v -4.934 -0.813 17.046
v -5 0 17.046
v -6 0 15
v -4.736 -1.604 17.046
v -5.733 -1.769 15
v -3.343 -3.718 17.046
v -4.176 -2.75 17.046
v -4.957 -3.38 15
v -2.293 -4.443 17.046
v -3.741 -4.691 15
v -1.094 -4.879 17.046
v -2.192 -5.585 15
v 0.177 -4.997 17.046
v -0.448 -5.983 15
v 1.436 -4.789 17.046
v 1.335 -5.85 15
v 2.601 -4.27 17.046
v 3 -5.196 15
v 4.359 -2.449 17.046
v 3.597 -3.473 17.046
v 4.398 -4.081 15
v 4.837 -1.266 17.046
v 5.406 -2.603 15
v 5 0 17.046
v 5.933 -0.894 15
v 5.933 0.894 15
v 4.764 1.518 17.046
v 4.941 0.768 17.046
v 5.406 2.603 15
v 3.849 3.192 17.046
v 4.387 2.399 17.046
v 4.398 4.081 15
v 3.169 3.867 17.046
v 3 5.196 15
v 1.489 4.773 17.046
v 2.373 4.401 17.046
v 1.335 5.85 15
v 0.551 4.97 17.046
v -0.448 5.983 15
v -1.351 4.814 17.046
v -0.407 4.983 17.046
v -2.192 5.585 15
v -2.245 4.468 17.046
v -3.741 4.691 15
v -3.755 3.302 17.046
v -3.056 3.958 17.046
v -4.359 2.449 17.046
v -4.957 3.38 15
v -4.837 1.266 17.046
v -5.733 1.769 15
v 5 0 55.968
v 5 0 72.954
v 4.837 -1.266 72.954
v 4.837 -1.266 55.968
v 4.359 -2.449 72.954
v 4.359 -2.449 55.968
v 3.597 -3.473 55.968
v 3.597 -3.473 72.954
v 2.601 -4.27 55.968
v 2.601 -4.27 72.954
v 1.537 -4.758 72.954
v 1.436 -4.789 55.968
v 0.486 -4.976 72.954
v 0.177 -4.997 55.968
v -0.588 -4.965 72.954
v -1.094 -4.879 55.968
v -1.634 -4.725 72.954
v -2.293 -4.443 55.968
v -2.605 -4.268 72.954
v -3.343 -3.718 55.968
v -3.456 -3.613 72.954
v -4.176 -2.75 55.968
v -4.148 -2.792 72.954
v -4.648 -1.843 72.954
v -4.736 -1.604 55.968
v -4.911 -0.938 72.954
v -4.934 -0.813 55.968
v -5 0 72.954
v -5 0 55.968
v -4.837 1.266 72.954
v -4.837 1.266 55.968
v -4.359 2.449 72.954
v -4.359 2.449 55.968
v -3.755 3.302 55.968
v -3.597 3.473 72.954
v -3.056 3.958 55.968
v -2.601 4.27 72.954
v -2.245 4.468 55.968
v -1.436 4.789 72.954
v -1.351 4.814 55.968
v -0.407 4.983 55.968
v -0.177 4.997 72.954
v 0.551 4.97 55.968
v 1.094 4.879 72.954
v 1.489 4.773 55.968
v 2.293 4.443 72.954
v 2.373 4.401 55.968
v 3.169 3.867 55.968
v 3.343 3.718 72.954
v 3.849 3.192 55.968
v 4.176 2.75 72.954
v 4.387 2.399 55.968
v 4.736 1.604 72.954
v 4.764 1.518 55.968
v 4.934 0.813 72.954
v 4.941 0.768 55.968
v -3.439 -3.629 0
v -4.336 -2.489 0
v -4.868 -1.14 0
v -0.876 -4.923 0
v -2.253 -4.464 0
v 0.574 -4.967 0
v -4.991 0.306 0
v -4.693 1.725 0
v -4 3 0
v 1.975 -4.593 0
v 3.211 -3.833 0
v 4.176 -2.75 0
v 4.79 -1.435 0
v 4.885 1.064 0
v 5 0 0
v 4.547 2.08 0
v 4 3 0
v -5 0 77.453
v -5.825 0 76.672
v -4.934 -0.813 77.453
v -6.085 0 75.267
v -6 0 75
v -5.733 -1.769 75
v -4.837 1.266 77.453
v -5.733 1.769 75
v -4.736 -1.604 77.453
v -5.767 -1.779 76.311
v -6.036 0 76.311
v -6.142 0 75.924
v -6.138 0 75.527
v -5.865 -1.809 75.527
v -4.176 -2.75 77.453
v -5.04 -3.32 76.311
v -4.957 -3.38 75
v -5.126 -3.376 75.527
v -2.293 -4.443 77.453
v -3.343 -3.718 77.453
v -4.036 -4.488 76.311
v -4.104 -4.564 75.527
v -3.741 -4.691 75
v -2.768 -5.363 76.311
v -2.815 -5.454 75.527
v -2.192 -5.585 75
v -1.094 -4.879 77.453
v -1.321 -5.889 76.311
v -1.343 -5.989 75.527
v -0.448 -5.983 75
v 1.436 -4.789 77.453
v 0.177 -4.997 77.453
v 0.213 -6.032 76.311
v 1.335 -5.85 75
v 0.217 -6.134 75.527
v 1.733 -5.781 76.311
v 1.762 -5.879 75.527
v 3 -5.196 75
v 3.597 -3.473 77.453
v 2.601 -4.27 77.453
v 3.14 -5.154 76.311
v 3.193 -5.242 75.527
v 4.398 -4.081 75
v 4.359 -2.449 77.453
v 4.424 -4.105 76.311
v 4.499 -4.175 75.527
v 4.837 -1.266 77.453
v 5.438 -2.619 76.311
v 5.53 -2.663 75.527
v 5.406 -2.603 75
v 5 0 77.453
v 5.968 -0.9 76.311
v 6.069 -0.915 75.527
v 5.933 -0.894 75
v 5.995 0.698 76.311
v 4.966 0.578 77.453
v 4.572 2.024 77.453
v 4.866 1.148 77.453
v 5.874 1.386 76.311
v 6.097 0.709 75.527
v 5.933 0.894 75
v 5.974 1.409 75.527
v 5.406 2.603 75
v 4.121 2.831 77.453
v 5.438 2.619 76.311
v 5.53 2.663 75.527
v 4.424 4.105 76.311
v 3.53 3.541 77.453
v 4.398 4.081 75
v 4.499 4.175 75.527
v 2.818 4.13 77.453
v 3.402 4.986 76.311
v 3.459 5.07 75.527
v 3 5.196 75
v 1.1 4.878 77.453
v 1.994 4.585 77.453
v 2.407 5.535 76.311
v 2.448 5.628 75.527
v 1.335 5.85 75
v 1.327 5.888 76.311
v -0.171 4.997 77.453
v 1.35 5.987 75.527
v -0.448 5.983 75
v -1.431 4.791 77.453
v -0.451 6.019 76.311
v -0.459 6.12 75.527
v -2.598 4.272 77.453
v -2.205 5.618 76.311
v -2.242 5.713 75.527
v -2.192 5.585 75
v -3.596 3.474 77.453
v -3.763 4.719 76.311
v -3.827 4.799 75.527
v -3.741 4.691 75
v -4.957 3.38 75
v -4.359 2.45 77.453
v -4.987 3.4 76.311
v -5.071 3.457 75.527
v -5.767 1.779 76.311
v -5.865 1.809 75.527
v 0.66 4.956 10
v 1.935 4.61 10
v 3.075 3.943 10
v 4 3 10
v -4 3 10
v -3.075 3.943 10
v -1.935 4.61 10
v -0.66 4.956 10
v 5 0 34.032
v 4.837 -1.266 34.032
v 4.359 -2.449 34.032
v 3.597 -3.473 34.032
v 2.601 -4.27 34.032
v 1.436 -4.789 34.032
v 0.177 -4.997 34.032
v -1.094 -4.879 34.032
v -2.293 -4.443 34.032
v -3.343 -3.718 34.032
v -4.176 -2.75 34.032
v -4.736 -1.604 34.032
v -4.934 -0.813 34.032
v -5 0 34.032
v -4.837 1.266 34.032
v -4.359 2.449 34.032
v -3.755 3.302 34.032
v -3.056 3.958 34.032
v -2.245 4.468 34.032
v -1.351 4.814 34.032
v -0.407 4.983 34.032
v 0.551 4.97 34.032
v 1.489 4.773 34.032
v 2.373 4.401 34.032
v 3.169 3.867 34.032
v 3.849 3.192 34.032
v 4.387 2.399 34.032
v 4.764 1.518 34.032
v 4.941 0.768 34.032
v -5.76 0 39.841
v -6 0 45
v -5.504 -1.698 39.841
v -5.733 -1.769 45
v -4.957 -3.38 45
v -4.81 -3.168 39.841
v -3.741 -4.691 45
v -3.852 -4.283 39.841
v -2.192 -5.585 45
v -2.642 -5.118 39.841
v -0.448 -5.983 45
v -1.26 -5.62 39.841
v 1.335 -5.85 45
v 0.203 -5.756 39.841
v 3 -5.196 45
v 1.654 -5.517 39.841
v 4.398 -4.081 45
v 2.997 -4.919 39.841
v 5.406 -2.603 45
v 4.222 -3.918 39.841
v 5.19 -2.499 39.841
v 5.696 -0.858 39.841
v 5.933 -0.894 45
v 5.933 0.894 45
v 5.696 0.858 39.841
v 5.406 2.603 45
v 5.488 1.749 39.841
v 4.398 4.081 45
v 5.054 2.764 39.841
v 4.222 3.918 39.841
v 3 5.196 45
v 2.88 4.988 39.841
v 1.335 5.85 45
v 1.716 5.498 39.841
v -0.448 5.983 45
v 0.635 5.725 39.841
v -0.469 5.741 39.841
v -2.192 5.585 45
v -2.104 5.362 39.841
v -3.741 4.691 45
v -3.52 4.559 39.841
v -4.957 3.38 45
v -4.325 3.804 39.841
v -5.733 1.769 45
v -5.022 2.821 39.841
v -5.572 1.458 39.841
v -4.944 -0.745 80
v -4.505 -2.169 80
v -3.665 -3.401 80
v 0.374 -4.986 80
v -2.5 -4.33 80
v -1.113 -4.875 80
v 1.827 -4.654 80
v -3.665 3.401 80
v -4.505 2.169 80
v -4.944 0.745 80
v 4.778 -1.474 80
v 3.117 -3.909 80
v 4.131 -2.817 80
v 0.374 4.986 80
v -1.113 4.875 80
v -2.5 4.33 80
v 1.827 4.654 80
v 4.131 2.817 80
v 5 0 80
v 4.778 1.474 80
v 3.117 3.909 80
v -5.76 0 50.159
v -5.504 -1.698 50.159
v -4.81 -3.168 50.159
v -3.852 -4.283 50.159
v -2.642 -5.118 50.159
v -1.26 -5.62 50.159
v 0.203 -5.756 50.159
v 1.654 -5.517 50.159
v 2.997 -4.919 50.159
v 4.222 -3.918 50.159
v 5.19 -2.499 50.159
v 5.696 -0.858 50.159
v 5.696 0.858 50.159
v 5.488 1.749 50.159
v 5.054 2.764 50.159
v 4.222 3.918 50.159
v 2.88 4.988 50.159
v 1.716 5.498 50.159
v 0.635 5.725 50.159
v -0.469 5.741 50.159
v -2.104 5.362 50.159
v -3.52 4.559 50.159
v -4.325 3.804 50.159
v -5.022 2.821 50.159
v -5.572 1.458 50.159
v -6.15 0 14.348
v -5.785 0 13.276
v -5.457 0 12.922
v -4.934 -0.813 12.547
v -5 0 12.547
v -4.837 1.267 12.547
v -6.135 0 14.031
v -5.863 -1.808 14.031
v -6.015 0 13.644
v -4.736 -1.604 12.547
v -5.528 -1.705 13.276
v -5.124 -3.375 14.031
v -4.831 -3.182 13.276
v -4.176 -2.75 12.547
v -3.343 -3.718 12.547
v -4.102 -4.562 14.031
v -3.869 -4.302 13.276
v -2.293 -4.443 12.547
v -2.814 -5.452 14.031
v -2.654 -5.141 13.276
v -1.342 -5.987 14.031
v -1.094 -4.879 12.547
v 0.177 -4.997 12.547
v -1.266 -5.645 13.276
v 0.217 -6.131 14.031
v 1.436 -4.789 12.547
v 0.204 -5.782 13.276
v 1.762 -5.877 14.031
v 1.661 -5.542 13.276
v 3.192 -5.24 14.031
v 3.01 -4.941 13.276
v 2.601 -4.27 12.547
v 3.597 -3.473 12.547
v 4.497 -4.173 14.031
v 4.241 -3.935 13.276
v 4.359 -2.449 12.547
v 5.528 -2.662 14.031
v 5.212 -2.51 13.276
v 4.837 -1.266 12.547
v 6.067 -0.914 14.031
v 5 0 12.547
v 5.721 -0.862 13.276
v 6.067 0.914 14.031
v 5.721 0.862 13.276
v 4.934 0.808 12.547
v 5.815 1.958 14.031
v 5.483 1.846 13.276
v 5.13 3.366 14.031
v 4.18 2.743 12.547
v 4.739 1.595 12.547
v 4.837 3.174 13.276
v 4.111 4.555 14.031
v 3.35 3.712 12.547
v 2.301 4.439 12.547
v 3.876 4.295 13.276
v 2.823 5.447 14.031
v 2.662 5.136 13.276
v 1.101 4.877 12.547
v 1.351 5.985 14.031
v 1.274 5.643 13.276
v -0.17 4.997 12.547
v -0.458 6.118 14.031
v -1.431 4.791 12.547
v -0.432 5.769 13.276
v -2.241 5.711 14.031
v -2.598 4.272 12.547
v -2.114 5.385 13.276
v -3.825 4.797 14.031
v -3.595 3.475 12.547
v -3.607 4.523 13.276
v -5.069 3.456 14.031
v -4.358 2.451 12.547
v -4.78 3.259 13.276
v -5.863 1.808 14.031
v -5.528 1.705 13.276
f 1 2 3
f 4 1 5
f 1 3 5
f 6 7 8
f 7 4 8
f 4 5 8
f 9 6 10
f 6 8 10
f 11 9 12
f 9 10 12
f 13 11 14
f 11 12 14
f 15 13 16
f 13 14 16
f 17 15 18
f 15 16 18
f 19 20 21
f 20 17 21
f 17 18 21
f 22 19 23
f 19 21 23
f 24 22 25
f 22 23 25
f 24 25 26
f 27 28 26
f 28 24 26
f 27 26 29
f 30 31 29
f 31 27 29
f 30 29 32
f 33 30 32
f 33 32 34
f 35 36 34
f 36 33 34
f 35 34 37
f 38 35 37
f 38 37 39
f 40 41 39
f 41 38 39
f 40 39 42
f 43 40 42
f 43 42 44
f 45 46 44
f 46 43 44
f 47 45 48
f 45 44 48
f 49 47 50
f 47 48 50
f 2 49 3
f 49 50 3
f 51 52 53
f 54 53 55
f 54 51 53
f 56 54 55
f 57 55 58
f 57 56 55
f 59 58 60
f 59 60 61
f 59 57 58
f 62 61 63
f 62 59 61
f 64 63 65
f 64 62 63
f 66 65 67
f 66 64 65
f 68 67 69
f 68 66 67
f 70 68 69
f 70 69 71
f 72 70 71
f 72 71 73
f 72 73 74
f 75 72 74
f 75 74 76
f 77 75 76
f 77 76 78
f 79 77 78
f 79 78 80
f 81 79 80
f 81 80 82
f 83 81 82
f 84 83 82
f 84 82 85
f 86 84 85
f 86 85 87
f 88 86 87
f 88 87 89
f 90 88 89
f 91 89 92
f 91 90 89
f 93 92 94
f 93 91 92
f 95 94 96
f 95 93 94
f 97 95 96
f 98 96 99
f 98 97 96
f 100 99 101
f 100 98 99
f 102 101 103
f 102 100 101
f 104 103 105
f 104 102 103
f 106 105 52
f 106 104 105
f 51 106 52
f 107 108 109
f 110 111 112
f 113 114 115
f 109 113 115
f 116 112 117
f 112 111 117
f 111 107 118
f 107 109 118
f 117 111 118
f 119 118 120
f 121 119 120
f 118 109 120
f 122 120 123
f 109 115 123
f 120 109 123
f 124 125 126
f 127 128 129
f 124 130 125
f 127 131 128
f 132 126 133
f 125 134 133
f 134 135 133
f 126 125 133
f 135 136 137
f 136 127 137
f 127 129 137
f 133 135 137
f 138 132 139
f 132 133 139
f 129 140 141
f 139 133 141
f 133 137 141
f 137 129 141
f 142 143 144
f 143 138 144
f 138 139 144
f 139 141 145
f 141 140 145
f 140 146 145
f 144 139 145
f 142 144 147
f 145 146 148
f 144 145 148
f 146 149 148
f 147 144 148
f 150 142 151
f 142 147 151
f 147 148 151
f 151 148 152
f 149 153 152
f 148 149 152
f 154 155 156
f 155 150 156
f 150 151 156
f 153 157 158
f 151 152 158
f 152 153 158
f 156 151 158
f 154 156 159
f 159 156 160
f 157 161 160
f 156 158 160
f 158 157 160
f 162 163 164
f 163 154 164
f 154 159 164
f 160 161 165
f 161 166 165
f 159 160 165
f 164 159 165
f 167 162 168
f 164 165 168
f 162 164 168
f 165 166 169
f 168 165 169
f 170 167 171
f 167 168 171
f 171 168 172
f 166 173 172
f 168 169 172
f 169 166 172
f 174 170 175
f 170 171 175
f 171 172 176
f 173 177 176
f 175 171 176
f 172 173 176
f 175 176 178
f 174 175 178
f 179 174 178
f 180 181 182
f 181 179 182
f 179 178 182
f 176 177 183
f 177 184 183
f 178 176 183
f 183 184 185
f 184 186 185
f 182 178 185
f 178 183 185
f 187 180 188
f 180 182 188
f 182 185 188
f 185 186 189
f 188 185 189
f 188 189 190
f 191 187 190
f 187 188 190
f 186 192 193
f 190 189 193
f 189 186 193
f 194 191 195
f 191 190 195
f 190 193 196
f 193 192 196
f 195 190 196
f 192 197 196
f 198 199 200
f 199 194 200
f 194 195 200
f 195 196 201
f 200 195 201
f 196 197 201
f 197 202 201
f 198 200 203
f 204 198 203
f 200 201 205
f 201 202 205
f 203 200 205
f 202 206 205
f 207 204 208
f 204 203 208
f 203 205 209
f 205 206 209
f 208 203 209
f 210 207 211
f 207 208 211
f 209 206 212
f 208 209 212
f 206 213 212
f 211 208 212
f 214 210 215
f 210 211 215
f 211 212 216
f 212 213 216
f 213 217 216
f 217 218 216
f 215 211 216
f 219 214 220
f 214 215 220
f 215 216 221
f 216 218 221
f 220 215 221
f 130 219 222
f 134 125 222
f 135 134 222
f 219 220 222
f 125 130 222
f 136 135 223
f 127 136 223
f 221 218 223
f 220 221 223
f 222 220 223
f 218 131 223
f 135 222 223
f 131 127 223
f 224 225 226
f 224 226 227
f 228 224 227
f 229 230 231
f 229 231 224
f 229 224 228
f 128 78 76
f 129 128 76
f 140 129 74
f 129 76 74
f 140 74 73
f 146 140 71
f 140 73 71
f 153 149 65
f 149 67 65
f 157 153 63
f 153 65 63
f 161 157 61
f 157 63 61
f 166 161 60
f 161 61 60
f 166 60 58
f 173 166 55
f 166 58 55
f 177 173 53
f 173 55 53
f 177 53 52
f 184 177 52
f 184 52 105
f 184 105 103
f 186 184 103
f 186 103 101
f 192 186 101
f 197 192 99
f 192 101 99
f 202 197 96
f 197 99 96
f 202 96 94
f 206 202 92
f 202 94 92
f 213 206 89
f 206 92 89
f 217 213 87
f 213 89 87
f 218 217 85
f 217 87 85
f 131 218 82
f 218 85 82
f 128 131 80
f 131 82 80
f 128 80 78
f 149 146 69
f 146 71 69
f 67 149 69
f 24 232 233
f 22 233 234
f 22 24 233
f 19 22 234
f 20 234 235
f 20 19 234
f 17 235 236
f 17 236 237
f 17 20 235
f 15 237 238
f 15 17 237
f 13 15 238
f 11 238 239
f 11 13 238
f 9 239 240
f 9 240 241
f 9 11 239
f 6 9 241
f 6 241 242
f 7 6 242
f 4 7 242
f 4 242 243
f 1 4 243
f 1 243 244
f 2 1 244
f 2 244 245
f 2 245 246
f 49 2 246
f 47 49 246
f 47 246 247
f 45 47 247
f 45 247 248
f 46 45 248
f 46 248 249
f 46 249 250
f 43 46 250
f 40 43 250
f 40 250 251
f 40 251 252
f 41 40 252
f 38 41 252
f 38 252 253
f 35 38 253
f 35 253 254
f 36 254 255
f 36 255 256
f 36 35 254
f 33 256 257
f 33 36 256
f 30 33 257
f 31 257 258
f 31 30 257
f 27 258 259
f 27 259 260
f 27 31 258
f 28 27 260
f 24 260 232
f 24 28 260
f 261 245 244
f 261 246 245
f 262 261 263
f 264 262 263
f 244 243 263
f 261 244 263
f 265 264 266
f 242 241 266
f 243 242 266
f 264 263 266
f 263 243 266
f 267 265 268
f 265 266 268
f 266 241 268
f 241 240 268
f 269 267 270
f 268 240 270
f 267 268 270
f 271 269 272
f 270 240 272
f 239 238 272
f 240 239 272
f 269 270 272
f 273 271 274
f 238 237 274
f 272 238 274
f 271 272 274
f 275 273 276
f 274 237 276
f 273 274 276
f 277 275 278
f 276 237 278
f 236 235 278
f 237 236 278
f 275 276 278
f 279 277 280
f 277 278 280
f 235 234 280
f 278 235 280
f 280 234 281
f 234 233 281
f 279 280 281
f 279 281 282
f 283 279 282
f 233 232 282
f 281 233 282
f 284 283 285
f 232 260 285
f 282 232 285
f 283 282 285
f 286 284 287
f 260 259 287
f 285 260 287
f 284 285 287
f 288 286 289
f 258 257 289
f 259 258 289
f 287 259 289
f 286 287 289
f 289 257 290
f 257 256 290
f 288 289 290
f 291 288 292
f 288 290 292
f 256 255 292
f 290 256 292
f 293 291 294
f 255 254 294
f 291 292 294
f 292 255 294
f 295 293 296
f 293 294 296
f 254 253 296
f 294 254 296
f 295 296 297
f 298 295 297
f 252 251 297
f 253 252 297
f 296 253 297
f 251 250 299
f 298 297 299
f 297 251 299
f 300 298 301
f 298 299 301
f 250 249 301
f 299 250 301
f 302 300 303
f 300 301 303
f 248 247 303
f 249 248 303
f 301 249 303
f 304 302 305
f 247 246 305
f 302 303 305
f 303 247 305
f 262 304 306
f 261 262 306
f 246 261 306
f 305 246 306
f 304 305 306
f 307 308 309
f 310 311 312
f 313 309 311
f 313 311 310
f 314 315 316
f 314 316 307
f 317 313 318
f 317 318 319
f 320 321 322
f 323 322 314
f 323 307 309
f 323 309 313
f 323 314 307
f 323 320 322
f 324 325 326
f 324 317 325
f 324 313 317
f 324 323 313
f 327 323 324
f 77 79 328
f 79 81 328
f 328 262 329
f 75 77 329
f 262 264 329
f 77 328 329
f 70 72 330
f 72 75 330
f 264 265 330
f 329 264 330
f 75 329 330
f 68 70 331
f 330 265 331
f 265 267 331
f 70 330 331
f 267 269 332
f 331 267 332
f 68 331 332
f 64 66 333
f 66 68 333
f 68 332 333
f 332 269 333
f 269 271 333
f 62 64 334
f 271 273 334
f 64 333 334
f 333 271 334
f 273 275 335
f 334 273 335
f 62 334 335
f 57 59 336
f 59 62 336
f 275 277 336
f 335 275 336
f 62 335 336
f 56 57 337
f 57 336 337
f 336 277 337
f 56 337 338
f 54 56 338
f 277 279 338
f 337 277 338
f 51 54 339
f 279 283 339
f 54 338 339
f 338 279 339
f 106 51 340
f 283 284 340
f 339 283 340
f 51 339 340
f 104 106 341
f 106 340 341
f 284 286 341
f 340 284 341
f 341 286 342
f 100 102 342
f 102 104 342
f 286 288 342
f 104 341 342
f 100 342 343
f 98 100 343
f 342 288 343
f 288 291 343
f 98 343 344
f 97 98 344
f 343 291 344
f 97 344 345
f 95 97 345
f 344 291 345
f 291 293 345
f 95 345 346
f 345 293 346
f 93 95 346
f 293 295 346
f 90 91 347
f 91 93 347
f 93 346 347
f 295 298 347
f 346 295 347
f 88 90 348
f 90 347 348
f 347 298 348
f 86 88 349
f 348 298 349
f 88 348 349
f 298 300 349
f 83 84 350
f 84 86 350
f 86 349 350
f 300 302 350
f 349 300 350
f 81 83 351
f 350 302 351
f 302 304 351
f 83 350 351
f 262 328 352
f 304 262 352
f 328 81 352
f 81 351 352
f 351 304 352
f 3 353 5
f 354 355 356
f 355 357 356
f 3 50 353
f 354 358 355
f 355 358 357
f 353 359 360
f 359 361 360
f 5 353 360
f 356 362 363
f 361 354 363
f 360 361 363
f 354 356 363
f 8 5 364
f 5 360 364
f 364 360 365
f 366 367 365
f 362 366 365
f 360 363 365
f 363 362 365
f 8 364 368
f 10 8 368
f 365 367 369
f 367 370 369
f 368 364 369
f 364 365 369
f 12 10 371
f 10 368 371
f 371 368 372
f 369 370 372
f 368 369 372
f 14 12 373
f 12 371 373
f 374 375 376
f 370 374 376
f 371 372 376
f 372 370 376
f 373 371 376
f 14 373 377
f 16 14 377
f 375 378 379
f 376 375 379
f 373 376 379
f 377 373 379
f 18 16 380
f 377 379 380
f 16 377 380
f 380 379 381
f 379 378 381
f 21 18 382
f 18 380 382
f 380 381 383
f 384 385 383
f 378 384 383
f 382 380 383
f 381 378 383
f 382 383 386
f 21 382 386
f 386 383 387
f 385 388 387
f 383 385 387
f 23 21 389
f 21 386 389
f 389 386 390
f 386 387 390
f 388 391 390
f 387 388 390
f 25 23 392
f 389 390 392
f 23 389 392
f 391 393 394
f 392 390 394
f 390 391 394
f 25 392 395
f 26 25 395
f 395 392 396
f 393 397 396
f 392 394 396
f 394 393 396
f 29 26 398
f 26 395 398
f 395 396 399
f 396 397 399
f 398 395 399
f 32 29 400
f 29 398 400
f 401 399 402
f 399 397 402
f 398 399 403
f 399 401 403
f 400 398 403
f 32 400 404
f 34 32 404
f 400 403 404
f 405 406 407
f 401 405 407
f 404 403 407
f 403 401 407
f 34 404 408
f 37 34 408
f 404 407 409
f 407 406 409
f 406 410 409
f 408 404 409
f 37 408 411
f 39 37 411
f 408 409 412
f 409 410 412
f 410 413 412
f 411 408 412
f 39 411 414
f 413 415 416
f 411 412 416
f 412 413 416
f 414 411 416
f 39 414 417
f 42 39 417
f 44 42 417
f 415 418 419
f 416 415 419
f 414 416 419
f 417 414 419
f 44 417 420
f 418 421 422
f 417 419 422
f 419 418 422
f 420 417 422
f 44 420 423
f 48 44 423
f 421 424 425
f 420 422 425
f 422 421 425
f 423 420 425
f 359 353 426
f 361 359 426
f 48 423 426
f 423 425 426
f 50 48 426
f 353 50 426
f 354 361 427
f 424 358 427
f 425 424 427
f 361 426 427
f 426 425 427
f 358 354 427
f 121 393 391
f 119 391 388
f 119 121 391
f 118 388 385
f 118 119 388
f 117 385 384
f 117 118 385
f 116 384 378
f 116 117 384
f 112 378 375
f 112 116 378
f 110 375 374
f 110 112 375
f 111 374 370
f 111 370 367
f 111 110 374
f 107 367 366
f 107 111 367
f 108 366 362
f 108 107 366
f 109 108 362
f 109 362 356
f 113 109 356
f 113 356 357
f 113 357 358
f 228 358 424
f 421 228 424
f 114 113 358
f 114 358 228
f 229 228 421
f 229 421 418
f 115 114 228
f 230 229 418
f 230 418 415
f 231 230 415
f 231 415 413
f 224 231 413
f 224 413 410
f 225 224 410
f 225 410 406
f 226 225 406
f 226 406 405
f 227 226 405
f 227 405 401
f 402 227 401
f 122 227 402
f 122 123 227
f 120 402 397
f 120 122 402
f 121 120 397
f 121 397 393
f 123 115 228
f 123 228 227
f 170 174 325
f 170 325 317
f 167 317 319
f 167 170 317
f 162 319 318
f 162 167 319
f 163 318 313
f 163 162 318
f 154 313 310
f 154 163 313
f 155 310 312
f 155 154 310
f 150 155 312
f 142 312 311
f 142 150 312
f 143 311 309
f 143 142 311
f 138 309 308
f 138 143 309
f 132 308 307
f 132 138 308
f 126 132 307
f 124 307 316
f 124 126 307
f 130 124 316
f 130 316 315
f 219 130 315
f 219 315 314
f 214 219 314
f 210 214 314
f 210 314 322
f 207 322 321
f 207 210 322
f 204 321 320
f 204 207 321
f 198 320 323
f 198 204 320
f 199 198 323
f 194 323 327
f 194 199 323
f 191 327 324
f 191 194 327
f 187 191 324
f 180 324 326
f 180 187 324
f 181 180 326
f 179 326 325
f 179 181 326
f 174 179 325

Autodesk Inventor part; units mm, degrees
ref_plane "YZ Plane" through (0, 0, 0) normal (1, 0, 0) x (0, 1, 0)
ref_plane "XY Plane" through (0, 0, 0) normal (0, 0, 1) x (1, 0, 0)
sketch "Эскиз1" plane through (0, 0, 0) normal (0, 0, 1) x (1, 0, 0)
  circle A0 centre (0, 0) radius 5
  dimension "d0" = 10
extrude "Выдавливание1" add sketch "Эскиз1" along normal blind 80
sketch "Эскиз2" plane through (0, 0, 0) normal (0, 0, -1) x (-1, 0, 0)
  line L0 (0, 0) -> (0, 3)
  line L1 (0, 3) -> (-4, 3)
  circle A0 centre (0, 0) radius 5 projected
  line L2 (4, 3) -> (0, 3)
extrude "Выдавливание2" cut sketch "Эскиз2" against normal blind 10 contours L1 A0 L2 picked at (-2.4012, 3.2796)
ref_plane "РабПлоскость1" through (0, 0, 0) normal (0, 1, 0) x (-1, 0, 0)
sketch "Эскиз3" plane through (0, 0, 0) normal (0, 1, 0) x (-1, 0, 0)
  line L0 (0, 10) -> (0, 80)
  line L1 (5, 80) -> (-5, 80) projected
  line L2 (0, 10) -> (0, 15)
  line L3 (0, 15) -> (6, 15)
  line L4 (0, 15) -> (0, 20)
  line L5 (0, 20) -> (4, 20)
  line L6 (0, 20) -> (0, 45)
  line L7 (0, 45) -> (0, 70)
  line L8 (0, 70) -> (4, 70)
  line L9 (0, 70) -> (0, 75)
  line L10 (0, 75) -> (6, 75)
  line L11 (0, 45) -> (6, 45)
  spline S0 degree 4 poles (0, 80) (13.7387, 74.1571) (-5.0029, 77.0727) (17.394, 45) (-5.0029, 12.9273) (13.7387, 15.8429) (0, 10) knots 0 0 0 0 0 0.409508 0.590492 1 1 1 1 1
  point P0 (0, 0)
  dimension "d7" = 5
  dimension "d8" = 6
  dimension "d9" = 5
  dimension "d10" = 4
  dimension "d11" = 25
  dimension "d12" = 25
  dimension "d13" = 4
revolve "Вращение1" add sketch "Эскиз3" angle 360 about axis through (0, 0, 10) along (0, 0, 1)
properties part number "Рукаядь рукоядки"
